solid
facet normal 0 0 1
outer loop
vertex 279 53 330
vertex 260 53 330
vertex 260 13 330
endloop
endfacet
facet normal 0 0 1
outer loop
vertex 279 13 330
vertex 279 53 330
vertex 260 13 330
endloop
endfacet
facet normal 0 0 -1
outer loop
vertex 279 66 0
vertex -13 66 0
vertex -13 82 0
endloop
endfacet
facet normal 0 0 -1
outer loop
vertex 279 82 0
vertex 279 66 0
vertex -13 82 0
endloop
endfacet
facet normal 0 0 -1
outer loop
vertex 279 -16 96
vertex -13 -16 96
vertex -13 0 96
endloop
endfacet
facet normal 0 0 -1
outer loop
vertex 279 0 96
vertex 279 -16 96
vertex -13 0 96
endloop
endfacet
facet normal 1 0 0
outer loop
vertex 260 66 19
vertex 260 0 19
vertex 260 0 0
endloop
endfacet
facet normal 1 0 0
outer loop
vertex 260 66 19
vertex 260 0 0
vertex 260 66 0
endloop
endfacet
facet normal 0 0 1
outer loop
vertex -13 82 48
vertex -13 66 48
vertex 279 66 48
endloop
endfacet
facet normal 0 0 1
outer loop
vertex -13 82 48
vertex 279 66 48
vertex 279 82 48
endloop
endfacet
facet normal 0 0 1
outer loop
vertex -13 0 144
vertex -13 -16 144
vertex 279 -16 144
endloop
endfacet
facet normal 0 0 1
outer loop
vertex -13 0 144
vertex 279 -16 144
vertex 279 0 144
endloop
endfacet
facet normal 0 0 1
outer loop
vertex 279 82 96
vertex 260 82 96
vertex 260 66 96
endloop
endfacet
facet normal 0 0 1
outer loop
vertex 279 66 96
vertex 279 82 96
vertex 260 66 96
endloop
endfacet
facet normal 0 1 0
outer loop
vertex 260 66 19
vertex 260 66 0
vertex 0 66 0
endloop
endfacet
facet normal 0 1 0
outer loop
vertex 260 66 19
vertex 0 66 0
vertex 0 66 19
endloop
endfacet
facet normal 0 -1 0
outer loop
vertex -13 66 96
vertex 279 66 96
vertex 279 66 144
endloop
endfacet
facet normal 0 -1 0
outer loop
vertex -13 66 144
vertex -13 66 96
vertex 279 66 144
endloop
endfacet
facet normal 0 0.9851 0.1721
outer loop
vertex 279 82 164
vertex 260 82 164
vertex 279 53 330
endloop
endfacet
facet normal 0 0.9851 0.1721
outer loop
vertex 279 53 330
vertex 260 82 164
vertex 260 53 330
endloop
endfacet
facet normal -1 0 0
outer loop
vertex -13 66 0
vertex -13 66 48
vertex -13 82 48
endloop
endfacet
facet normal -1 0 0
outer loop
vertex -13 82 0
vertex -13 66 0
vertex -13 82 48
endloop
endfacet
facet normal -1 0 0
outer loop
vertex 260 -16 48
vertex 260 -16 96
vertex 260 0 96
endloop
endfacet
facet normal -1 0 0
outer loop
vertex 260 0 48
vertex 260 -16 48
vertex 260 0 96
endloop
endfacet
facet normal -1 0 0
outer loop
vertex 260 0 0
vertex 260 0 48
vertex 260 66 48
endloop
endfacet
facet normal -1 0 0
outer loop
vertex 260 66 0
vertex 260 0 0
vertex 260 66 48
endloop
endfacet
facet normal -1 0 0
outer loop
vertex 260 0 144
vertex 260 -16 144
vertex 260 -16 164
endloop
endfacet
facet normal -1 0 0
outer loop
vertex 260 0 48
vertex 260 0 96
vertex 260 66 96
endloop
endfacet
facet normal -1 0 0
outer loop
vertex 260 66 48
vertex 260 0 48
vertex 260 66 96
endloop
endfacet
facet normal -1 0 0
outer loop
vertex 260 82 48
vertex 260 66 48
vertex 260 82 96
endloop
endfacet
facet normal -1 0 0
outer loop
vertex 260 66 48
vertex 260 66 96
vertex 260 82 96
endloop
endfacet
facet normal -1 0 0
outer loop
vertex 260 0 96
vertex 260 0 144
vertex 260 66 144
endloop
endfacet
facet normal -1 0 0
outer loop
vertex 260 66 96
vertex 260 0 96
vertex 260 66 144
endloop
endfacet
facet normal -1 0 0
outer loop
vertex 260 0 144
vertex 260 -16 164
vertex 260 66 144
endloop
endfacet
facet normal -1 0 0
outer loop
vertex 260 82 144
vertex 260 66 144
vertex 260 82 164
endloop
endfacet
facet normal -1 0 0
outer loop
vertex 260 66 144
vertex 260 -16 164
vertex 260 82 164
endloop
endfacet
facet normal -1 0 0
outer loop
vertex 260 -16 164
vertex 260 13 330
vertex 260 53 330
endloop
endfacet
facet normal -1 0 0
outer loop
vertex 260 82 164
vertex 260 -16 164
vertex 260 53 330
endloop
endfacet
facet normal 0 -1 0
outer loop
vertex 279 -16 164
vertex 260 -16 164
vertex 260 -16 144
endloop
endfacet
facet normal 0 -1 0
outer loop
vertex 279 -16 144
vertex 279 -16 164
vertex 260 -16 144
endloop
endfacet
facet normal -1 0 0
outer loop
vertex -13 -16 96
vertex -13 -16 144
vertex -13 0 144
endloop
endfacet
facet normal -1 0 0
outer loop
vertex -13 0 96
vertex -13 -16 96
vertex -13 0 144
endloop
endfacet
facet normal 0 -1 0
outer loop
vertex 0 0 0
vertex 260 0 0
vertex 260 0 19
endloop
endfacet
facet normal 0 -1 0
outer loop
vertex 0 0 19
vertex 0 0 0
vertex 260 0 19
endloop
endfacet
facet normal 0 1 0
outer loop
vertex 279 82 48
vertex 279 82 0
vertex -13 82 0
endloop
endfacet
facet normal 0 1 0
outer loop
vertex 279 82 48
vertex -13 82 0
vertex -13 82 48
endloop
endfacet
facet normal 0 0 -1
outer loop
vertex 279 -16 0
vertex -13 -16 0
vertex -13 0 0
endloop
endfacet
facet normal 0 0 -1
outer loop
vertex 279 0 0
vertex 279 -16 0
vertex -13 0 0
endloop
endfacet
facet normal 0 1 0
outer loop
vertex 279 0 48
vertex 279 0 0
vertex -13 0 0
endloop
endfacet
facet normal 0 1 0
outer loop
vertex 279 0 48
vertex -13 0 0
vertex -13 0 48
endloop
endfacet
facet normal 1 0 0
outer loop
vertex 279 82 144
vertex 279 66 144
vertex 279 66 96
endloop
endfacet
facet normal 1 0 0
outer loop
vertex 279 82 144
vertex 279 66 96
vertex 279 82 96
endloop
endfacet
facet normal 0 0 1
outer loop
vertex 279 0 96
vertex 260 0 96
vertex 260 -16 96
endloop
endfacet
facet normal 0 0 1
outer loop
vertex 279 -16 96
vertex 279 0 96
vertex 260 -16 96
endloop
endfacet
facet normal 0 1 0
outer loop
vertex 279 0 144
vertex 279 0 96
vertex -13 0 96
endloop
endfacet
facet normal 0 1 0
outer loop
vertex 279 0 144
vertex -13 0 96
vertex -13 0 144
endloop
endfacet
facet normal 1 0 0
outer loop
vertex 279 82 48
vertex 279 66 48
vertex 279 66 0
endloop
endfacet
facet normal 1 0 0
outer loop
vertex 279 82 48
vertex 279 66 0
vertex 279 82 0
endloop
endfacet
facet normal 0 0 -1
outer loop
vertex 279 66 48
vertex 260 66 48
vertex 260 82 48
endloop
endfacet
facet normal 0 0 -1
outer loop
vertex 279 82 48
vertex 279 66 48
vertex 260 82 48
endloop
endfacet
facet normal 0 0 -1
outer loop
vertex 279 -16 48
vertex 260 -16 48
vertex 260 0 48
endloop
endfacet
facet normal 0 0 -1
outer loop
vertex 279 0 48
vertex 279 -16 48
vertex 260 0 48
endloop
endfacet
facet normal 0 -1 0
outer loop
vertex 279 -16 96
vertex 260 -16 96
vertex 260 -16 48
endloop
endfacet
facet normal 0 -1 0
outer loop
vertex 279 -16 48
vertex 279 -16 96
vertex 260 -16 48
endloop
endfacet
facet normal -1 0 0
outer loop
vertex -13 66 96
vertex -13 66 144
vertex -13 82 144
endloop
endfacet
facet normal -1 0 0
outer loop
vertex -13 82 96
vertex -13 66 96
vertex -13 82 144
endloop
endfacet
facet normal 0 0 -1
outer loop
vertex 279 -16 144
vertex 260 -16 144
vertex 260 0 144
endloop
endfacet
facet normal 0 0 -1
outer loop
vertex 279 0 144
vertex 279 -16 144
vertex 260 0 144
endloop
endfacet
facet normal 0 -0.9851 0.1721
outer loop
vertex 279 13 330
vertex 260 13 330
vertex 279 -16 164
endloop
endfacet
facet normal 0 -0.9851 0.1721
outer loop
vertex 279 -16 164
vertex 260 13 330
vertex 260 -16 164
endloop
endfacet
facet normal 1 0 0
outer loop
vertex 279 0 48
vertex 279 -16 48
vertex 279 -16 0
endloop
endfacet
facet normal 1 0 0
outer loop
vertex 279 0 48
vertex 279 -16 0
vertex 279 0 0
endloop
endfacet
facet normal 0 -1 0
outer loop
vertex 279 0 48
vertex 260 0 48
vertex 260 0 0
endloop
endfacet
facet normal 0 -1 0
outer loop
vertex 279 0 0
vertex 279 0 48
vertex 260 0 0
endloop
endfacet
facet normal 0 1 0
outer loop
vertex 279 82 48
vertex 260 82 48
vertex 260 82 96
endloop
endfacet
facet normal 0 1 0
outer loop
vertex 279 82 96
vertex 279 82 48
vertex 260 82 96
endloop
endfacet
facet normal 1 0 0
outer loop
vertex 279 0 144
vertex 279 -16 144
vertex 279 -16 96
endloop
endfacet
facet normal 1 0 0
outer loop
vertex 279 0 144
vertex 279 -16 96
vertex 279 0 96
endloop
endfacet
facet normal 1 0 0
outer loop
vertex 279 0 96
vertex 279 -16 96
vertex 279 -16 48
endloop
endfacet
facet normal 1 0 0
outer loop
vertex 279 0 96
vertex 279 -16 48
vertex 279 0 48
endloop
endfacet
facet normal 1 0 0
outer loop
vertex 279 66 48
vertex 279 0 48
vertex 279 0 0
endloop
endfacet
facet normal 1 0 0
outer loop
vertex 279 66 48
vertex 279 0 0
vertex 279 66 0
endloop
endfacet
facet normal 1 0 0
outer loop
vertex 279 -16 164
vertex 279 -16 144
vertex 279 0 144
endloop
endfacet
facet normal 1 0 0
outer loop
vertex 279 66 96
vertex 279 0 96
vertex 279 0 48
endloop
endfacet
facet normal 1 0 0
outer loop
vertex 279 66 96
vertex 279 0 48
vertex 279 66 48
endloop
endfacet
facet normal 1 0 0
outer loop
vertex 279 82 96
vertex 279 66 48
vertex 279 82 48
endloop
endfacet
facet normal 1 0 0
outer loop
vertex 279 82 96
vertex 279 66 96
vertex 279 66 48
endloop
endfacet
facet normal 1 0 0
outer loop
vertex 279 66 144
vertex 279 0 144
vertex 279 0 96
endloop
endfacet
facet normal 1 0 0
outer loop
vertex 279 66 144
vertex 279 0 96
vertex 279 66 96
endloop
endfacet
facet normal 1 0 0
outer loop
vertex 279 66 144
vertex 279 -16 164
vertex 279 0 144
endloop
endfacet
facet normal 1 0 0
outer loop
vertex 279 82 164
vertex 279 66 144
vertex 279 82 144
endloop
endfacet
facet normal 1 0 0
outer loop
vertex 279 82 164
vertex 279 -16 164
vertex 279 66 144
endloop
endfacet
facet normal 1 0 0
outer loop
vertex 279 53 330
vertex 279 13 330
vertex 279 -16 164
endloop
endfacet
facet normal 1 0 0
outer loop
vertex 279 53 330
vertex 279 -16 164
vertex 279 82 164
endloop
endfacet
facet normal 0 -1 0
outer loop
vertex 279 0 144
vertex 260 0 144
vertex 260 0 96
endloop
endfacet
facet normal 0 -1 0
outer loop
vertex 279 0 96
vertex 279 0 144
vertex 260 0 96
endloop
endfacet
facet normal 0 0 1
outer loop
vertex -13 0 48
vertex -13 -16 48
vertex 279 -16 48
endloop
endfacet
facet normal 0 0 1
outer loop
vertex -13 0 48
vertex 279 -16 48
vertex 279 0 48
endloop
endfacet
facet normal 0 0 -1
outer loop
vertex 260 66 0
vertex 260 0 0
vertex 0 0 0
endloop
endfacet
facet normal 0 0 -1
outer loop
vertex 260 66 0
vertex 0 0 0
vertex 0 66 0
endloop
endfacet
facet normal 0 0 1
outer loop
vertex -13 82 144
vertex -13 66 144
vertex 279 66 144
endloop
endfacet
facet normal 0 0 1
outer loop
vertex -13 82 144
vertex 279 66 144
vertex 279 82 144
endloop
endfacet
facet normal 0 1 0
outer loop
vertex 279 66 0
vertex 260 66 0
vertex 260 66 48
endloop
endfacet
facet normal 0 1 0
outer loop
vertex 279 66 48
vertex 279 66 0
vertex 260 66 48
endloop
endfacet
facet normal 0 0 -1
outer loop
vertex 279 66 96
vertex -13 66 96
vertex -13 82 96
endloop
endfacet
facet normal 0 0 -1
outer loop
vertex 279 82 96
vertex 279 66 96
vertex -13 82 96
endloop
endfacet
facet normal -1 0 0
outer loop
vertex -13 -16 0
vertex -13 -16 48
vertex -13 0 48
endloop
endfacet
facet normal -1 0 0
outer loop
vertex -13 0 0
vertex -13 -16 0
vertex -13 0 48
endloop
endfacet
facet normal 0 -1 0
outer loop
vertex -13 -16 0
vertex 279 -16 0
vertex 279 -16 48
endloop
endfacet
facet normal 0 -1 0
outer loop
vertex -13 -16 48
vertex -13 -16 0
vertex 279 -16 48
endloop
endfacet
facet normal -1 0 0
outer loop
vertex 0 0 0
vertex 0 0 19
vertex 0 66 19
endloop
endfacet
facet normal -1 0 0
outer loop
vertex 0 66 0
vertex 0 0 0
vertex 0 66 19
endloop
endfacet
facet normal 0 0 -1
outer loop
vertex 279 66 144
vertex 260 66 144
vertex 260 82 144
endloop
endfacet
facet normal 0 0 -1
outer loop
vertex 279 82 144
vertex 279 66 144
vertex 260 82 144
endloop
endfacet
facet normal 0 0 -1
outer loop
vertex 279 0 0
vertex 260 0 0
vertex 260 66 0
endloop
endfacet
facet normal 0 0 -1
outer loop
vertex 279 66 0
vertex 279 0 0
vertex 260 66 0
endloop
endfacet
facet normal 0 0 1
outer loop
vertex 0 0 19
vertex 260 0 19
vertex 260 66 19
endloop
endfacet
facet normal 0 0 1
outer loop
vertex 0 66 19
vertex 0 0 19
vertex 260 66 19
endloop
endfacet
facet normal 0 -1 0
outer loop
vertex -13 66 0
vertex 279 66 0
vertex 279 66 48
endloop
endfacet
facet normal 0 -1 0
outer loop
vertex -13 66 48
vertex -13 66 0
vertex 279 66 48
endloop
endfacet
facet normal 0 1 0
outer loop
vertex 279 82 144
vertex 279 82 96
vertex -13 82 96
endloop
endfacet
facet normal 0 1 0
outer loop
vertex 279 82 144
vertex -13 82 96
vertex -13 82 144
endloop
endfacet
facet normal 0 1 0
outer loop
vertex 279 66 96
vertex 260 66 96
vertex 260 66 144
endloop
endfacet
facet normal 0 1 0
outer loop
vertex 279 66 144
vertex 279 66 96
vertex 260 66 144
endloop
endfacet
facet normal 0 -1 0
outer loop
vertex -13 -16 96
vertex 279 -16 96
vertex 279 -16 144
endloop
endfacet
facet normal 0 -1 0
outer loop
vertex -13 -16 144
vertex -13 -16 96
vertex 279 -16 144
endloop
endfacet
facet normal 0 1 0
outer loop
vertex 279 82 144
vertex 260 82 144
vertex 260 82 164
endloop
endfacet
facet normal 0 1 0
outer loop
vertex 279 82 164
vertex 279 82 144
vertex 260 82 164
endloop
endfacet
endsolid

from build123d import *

# Parameters (mm, degrees)
F0_W     = 66
F0_H     = 19
F1_DEPTH = 260
F2_W     = 66
F2_H     = 19
F3_DEPTH = 19
F4_W     = 16
F4_H     = 48
F5_DEPTH = 292


with BuildPart() as f1:
    # F0 (on Right) → F1 (new body)
    with BuildSketch(Plane.YZ):
        with Locations((33, 9.5)):
            Rectangle(F0_W, F0_H)
    extrude(amount=F1_DEPTH)


with BuildPart() as f3:
    # F2 (on face) → F3 (new body)
    with BuildSketch(Plane.YZ.offset(260)):
        Polygon((0, 48), (0, 19), (66, 19), (66, 48), (82, 48), (82, 96), (66, 96), (66, 144), (82, 144), (82, 164), (53, 330), (33, 330), (13, 330), (-16, 164), (-16, 144), (0, 144), (0, 96), (-16, 96), (-16, 48), align=None)
        with Locations((33, 9.5)):
            Rectangle(F2_W, F2_H)
    extrude(amount=F3_DEPTH)


with BuildPart() as f5:
    # F4 (on face) → F5 (new body)
    with BuildSketch(Plane.YZ.offset(279)):
        with Locations((-8, 24)):
            Rectangle(F4_W, F4_H)
        with Locations((-8, 120)):
            Rectangle(F4_W, F4_H)
        with Locations((74, 120)):
            Rectangle(F4_W, F4_H)
        with Locations((74, 24)):
            Rectangle(F4_W, F4_H)
    extrude(amount=-F5_DEPTH)


solid = Compound([f1.part, f3.part, f5.part])
